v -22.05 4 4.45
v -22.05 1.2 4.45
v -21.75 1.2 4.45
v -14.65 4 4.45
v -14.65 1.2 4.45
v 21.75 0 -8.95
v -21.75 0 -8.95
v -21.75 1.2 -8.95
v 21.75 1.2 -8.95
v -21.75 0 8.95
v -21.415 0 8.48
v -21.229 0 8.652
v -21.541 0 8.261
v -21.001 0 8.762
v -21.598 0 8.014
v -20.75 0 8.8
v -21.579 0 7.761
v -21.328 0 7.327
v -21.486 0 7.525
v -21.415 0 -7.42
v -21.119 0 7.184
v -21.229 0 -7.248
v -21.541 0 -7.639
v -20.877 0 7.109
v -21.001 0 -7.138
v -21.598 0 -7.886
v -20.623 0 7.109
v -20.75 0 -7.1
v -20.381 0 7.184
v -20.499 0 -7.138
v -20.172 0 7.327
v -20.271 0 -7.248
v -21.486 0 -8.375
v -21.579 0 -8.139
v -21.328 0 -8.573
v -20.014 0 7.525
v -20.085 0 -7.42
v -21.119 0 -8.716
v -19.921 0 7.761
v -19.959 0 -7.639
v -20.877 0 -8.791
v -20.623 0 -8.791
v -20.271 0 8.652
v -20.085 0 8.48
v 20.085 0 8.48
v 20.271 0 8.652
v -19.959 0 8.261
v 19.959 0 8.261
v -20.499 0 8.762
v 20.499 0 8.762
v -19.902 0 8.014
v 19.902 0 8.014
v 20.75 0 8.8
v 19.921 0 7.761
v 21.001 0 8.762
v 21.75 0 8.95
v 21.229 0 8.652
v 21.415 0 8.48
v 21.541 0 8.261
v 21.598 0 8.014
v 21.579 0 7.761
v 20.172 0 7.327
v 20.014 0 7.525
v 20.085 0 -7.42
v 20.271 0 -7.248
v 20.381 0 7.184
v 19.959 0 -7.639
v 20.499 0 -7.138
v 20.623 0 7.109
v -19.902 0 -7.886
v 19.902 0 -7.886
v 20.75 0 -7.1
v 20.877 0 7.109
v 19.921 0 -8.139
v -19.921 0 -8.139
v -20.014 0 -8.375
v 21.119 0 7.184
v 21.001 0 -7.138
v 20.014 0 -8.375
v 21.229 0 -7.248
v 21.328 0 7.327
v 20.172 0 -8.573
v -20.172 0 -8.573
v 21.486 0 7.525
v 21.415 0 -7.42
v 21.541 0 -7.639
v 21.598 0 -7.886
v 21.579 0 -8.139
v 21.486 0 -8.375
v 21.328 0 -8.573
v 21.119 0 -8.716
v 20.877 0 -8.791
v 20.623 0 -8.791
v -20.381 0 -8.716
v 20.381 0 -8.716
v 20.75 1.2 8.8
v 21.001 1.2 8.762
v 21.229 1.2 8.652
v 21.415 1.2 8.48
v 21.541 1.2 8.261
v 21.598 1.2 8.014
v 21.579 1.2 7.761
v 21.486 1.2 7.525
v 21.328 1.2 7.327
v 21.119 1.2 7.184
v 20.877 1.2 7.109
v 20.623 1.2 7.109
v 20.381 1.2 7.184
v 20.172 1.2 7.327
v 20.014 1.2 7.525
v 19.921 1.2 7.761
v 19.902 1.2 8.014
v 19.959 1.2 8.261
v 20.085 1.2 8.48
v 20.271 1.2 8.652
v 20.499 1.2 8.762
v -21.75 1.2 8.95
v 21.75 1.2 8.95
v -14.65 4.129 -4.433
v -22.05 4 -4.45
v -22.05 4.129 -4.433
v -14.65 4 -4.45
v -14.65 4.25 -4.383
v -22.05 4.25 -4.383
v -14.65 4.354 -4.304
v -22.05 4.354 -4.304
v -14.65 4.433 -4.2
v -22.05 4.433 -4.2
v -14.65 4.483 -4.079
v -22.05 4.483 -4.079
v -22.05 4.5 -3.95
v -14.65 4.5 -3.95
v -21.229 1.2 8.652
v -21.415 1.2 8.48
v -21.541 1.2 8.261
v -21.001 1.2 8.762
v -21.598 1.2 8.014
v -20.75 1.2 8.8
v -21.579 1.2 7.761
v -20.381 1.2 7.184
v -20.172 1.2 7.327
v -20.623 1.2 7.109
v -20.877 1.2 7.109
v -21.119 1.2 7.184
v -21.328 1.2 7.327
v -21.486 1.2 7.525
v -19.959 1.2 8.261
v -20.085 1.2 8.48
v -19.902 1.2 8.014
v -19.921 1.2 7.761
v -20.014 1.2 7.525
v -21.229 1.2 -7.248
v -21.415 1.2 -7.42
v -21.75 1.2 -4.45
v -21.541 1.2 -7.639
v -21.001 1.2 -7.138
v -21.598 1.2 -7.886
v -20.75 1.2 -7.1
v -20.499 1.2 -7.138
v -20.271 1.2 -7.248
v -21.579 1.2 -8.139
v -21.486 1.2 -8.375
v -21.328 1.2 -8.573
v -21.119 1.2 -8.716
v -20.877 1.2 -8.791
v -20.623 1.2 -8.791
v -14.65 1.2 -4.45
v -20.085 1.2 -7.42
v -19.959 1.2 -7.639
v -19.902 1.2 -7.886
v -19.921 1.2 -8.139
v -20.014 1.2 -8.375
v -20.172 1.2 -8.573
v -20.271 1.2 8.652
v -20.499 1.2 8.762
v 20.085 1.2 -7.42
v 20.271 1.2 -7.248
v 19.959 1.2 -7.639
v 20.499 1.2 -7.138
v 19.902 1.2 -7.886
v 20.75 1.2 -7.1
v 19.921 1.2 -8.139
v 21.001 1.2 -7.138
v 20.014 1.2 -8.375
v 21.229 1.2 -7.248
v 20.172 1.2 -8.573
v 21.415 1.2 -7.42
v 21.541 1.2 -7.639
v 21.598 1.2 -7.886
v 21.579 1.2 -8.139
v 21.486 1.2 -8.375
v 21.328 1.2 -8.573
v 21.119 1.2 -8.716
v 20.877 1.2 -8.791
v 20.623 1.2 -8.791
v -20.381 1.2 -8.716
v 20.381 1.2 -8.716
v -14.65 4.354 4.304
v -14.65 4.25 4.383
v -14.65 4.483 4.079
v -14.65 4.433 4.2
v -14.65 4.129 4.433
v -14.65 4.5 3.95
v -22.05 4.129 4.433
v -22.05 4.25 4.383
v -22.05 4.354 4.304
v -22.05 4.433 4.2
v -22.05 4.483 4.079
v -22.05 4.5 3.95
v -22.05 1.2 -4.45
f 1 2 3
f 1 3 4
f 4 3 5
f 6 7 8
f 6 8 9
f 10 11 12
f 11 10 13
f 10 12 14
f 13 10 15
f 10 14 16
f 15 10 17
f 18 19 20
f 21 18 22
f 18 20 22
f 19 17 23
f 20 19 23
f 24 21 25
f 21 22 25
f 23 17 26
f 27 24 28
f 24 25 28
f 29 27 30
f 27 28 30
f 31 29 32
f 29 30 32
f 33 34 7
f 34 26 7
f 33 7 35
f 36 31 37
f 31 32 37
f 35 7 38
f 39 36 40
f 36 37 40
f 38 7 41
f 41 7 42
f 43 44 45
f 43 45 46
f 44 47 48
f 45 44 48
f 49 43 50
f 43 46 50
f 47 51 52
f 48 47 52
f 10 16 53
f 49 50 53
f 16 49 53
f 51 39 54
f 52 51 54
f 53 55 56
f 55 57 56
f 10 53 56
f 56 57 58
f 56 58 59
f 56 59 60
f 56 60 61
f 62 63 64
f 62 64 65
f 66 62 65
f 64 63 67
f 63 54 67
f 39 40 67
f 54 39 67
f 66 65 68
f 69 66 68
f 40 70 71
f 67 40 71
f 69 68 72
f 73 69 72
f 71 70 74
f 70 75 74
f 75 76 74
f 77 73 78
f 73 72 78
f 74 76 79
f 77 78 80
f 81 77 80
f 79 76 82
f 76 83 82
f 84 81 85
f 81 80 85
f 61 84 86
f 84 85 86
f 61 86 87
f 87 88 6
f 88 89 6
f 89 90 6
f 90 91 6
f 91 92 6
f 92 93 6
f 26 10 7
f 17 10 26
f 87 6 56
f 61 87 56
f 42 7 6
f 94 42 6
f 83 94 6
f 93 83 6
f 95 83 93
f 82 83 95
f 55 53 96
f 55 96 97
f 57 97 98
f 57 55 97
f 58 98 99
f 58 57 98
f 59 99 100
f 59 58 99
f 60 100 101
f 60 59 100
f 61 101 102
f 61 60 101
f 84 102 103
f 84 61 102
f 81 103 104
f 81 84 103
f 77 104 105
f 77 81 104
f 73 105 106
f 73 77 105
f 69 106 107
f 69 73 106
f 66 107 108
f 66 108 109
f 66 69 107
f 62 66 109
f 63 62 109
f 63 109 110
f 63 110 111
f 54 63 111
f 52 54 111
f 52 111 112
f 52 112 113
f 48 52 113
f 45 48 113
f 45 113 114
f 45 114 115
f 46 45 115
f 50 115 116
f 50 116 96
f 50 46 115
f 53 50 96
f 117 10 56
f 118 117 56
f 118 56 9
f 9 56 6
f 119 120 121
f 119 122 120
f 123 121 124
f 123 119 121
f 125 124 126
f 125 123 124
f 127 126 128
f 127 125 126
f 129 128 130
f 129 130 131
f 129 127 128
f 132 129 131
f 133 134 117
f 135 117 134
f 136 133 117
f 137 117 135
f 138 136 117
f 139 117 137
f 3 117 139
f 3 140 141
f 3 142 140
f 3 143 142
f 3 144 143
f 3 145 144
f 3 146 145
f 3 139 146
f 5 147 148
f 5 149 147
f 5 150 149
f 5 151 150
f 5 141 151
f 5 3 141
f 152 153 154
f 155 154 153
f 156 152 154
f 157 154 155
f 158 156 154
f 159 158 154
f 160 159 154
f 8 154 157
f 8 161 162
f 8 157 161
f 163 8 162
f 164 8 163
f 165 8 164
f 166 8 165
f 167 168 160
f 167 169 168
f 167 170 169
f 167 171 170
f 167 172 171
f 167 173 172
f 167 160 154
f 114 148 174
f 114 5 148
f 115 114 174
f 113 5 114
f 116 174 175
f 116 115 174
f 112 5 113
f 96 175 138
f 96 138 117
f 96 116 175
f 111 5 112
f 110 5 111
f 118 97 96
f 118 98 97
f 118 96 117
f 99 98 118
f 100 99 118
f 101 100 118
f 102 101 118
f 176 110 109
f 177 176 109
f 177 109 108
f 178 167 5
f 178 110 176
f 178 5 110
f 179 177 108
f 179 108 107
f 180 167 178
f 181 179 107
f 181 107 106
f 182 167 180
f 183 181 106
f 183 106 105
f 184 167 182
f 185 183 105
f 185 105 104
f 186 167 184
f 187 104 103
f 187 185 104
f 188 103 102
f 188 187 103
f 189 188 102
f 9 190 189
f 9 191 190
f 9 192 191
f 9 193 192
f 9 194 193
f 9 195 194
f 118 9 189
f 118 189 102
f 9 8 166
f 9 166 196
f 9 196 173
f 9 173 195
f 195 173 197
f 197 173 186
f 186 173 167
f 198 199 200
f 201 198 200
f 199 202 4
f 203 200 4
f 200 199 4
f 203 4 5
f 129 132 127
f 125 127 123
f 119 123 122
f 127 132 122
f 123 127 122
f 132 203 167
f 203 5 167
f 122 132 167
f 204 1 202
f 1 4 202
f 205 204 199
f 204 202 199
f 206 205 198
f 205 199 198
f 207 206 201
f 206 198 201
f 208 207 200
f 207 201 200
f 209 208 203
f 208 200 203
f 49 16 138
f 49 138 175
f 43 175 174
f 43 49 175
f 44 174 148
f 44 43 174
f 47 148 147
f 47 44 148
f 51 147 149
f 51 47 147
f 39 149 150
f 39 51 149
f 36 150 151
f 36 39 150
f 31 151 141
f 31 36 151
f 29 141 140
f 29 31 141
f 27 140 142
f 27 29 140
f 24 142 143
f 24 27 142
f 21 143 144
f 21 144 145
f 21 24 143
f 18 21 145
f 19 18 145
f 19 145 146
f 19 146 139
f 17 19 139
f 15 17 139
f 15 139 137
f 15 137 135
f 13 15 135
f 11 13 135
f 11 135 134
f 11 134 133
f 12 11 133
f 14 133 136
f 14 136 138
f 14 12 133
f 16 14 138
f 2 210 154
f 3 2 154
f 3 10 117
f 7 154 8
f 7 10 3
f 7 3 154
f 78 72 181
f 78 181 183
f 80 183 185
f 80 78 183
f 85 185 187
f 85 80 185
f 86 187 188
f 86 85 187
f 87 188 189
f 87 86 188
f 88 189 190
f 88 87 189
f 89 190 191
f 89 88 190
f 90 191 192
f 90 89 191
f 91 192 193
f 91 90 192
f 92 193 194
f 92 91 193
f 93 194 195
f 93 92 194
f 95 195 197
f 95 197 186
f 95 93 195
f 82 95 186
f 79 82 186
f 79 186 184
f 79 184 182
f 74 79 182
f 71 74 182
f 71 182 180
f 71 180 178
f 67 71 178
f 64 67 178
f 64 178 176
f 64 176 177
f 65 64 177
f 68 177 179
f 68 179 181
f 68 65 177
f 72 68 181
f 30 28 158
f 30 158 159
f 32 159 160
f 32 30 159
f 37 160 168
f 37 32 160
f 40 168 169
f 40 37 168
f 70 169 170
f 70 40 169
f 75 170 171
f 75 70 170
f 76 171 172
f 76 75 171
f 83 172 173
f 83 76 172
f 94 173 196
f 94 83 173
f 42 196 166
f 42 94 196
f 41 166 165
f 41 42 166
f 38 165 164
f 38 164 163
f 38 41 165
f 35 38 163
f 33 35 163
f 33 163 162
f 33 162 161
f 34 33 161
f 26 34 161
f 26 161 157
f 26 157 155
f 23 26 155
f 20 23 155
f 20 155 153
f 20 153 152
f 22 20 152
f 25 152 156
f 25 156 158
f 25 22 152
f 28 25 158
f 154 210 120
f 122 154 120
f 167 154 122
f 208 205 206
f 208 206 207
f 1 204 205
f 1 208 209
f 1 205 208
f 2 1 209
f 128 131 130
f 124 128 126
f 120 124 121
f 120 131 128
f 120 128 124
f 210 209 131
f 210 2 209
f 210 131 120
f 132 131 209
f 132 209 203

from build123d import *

# Parameters (mm, degrees)
SKETCH1_W           = 43.5
SKETCH1_H           = 17.9
SKETCH1_R           = 0.85
BOSS_EXTRUDE1_DEPTH = 1.2
SKETCH2_W           = 7.4
SKETCH2_H           = 8.9
BOSS_EXTRUDE2_DEPTH = 3.3
FILLET1_R           = 0.5


with BuildPart() as part:
    # Sketch1 → Boss-Extrude1 (new body)
    with BuildSketch(Plane(origin=(0, 0, 0), x_dir=(1, 0, 0), z_dir=(0, 1, 0))):
        Rectangle(SKETCH1_W, SKETCH1_H)
        with Locations(Location((-20.75, 7.95, 0), (0, 0, 270))):
            Circle(SKETCH1_R, mode=Mode.SUBTRACT)
        with Locations(Location((20.75, -7.95, 0), (0, 0, 270))):
            Circle(SKETCH1_R, mode=Mode.SUBTRACT)
        with Locations(Location((20.75, 7.95, 0), (0, 0, 270))):
            Circle(SKETCH1_R, mode=Mode.SUBTRACT)
        with Locations(Location((-20.75, -7.95, 0), (0, 0, 270))):
            Circle(SKETCH1_R, mode=Mode.SUBTRACT)
    extrude(amount=BOSS_EXTRUDE1_DEPTH)

    # Sketch2 → Boss-Extrude2 (add)
    with BuildSketch(Plane(origin=(0, 1.2, 0), x_dir=(1, 0, 0), z_dir=(0, 1, 0))):
        with Locations((-18.35, 0)):
            Rectangle(SKETCH2_W, SKETCH2_H)
    extrude(amount=BOSS_EXTRUDE2_DEPTH)

    # Fillet1
    fillet1_edges = [part.edges().sort_by_distance(p)[0] for p in [
        (-18.35, 4.5, 4.45),
        (-18.35, 4.5, -4.45),
    ]]
    fillet(fillet1_edges, radius=FILLET1_R)


solid = part.part
